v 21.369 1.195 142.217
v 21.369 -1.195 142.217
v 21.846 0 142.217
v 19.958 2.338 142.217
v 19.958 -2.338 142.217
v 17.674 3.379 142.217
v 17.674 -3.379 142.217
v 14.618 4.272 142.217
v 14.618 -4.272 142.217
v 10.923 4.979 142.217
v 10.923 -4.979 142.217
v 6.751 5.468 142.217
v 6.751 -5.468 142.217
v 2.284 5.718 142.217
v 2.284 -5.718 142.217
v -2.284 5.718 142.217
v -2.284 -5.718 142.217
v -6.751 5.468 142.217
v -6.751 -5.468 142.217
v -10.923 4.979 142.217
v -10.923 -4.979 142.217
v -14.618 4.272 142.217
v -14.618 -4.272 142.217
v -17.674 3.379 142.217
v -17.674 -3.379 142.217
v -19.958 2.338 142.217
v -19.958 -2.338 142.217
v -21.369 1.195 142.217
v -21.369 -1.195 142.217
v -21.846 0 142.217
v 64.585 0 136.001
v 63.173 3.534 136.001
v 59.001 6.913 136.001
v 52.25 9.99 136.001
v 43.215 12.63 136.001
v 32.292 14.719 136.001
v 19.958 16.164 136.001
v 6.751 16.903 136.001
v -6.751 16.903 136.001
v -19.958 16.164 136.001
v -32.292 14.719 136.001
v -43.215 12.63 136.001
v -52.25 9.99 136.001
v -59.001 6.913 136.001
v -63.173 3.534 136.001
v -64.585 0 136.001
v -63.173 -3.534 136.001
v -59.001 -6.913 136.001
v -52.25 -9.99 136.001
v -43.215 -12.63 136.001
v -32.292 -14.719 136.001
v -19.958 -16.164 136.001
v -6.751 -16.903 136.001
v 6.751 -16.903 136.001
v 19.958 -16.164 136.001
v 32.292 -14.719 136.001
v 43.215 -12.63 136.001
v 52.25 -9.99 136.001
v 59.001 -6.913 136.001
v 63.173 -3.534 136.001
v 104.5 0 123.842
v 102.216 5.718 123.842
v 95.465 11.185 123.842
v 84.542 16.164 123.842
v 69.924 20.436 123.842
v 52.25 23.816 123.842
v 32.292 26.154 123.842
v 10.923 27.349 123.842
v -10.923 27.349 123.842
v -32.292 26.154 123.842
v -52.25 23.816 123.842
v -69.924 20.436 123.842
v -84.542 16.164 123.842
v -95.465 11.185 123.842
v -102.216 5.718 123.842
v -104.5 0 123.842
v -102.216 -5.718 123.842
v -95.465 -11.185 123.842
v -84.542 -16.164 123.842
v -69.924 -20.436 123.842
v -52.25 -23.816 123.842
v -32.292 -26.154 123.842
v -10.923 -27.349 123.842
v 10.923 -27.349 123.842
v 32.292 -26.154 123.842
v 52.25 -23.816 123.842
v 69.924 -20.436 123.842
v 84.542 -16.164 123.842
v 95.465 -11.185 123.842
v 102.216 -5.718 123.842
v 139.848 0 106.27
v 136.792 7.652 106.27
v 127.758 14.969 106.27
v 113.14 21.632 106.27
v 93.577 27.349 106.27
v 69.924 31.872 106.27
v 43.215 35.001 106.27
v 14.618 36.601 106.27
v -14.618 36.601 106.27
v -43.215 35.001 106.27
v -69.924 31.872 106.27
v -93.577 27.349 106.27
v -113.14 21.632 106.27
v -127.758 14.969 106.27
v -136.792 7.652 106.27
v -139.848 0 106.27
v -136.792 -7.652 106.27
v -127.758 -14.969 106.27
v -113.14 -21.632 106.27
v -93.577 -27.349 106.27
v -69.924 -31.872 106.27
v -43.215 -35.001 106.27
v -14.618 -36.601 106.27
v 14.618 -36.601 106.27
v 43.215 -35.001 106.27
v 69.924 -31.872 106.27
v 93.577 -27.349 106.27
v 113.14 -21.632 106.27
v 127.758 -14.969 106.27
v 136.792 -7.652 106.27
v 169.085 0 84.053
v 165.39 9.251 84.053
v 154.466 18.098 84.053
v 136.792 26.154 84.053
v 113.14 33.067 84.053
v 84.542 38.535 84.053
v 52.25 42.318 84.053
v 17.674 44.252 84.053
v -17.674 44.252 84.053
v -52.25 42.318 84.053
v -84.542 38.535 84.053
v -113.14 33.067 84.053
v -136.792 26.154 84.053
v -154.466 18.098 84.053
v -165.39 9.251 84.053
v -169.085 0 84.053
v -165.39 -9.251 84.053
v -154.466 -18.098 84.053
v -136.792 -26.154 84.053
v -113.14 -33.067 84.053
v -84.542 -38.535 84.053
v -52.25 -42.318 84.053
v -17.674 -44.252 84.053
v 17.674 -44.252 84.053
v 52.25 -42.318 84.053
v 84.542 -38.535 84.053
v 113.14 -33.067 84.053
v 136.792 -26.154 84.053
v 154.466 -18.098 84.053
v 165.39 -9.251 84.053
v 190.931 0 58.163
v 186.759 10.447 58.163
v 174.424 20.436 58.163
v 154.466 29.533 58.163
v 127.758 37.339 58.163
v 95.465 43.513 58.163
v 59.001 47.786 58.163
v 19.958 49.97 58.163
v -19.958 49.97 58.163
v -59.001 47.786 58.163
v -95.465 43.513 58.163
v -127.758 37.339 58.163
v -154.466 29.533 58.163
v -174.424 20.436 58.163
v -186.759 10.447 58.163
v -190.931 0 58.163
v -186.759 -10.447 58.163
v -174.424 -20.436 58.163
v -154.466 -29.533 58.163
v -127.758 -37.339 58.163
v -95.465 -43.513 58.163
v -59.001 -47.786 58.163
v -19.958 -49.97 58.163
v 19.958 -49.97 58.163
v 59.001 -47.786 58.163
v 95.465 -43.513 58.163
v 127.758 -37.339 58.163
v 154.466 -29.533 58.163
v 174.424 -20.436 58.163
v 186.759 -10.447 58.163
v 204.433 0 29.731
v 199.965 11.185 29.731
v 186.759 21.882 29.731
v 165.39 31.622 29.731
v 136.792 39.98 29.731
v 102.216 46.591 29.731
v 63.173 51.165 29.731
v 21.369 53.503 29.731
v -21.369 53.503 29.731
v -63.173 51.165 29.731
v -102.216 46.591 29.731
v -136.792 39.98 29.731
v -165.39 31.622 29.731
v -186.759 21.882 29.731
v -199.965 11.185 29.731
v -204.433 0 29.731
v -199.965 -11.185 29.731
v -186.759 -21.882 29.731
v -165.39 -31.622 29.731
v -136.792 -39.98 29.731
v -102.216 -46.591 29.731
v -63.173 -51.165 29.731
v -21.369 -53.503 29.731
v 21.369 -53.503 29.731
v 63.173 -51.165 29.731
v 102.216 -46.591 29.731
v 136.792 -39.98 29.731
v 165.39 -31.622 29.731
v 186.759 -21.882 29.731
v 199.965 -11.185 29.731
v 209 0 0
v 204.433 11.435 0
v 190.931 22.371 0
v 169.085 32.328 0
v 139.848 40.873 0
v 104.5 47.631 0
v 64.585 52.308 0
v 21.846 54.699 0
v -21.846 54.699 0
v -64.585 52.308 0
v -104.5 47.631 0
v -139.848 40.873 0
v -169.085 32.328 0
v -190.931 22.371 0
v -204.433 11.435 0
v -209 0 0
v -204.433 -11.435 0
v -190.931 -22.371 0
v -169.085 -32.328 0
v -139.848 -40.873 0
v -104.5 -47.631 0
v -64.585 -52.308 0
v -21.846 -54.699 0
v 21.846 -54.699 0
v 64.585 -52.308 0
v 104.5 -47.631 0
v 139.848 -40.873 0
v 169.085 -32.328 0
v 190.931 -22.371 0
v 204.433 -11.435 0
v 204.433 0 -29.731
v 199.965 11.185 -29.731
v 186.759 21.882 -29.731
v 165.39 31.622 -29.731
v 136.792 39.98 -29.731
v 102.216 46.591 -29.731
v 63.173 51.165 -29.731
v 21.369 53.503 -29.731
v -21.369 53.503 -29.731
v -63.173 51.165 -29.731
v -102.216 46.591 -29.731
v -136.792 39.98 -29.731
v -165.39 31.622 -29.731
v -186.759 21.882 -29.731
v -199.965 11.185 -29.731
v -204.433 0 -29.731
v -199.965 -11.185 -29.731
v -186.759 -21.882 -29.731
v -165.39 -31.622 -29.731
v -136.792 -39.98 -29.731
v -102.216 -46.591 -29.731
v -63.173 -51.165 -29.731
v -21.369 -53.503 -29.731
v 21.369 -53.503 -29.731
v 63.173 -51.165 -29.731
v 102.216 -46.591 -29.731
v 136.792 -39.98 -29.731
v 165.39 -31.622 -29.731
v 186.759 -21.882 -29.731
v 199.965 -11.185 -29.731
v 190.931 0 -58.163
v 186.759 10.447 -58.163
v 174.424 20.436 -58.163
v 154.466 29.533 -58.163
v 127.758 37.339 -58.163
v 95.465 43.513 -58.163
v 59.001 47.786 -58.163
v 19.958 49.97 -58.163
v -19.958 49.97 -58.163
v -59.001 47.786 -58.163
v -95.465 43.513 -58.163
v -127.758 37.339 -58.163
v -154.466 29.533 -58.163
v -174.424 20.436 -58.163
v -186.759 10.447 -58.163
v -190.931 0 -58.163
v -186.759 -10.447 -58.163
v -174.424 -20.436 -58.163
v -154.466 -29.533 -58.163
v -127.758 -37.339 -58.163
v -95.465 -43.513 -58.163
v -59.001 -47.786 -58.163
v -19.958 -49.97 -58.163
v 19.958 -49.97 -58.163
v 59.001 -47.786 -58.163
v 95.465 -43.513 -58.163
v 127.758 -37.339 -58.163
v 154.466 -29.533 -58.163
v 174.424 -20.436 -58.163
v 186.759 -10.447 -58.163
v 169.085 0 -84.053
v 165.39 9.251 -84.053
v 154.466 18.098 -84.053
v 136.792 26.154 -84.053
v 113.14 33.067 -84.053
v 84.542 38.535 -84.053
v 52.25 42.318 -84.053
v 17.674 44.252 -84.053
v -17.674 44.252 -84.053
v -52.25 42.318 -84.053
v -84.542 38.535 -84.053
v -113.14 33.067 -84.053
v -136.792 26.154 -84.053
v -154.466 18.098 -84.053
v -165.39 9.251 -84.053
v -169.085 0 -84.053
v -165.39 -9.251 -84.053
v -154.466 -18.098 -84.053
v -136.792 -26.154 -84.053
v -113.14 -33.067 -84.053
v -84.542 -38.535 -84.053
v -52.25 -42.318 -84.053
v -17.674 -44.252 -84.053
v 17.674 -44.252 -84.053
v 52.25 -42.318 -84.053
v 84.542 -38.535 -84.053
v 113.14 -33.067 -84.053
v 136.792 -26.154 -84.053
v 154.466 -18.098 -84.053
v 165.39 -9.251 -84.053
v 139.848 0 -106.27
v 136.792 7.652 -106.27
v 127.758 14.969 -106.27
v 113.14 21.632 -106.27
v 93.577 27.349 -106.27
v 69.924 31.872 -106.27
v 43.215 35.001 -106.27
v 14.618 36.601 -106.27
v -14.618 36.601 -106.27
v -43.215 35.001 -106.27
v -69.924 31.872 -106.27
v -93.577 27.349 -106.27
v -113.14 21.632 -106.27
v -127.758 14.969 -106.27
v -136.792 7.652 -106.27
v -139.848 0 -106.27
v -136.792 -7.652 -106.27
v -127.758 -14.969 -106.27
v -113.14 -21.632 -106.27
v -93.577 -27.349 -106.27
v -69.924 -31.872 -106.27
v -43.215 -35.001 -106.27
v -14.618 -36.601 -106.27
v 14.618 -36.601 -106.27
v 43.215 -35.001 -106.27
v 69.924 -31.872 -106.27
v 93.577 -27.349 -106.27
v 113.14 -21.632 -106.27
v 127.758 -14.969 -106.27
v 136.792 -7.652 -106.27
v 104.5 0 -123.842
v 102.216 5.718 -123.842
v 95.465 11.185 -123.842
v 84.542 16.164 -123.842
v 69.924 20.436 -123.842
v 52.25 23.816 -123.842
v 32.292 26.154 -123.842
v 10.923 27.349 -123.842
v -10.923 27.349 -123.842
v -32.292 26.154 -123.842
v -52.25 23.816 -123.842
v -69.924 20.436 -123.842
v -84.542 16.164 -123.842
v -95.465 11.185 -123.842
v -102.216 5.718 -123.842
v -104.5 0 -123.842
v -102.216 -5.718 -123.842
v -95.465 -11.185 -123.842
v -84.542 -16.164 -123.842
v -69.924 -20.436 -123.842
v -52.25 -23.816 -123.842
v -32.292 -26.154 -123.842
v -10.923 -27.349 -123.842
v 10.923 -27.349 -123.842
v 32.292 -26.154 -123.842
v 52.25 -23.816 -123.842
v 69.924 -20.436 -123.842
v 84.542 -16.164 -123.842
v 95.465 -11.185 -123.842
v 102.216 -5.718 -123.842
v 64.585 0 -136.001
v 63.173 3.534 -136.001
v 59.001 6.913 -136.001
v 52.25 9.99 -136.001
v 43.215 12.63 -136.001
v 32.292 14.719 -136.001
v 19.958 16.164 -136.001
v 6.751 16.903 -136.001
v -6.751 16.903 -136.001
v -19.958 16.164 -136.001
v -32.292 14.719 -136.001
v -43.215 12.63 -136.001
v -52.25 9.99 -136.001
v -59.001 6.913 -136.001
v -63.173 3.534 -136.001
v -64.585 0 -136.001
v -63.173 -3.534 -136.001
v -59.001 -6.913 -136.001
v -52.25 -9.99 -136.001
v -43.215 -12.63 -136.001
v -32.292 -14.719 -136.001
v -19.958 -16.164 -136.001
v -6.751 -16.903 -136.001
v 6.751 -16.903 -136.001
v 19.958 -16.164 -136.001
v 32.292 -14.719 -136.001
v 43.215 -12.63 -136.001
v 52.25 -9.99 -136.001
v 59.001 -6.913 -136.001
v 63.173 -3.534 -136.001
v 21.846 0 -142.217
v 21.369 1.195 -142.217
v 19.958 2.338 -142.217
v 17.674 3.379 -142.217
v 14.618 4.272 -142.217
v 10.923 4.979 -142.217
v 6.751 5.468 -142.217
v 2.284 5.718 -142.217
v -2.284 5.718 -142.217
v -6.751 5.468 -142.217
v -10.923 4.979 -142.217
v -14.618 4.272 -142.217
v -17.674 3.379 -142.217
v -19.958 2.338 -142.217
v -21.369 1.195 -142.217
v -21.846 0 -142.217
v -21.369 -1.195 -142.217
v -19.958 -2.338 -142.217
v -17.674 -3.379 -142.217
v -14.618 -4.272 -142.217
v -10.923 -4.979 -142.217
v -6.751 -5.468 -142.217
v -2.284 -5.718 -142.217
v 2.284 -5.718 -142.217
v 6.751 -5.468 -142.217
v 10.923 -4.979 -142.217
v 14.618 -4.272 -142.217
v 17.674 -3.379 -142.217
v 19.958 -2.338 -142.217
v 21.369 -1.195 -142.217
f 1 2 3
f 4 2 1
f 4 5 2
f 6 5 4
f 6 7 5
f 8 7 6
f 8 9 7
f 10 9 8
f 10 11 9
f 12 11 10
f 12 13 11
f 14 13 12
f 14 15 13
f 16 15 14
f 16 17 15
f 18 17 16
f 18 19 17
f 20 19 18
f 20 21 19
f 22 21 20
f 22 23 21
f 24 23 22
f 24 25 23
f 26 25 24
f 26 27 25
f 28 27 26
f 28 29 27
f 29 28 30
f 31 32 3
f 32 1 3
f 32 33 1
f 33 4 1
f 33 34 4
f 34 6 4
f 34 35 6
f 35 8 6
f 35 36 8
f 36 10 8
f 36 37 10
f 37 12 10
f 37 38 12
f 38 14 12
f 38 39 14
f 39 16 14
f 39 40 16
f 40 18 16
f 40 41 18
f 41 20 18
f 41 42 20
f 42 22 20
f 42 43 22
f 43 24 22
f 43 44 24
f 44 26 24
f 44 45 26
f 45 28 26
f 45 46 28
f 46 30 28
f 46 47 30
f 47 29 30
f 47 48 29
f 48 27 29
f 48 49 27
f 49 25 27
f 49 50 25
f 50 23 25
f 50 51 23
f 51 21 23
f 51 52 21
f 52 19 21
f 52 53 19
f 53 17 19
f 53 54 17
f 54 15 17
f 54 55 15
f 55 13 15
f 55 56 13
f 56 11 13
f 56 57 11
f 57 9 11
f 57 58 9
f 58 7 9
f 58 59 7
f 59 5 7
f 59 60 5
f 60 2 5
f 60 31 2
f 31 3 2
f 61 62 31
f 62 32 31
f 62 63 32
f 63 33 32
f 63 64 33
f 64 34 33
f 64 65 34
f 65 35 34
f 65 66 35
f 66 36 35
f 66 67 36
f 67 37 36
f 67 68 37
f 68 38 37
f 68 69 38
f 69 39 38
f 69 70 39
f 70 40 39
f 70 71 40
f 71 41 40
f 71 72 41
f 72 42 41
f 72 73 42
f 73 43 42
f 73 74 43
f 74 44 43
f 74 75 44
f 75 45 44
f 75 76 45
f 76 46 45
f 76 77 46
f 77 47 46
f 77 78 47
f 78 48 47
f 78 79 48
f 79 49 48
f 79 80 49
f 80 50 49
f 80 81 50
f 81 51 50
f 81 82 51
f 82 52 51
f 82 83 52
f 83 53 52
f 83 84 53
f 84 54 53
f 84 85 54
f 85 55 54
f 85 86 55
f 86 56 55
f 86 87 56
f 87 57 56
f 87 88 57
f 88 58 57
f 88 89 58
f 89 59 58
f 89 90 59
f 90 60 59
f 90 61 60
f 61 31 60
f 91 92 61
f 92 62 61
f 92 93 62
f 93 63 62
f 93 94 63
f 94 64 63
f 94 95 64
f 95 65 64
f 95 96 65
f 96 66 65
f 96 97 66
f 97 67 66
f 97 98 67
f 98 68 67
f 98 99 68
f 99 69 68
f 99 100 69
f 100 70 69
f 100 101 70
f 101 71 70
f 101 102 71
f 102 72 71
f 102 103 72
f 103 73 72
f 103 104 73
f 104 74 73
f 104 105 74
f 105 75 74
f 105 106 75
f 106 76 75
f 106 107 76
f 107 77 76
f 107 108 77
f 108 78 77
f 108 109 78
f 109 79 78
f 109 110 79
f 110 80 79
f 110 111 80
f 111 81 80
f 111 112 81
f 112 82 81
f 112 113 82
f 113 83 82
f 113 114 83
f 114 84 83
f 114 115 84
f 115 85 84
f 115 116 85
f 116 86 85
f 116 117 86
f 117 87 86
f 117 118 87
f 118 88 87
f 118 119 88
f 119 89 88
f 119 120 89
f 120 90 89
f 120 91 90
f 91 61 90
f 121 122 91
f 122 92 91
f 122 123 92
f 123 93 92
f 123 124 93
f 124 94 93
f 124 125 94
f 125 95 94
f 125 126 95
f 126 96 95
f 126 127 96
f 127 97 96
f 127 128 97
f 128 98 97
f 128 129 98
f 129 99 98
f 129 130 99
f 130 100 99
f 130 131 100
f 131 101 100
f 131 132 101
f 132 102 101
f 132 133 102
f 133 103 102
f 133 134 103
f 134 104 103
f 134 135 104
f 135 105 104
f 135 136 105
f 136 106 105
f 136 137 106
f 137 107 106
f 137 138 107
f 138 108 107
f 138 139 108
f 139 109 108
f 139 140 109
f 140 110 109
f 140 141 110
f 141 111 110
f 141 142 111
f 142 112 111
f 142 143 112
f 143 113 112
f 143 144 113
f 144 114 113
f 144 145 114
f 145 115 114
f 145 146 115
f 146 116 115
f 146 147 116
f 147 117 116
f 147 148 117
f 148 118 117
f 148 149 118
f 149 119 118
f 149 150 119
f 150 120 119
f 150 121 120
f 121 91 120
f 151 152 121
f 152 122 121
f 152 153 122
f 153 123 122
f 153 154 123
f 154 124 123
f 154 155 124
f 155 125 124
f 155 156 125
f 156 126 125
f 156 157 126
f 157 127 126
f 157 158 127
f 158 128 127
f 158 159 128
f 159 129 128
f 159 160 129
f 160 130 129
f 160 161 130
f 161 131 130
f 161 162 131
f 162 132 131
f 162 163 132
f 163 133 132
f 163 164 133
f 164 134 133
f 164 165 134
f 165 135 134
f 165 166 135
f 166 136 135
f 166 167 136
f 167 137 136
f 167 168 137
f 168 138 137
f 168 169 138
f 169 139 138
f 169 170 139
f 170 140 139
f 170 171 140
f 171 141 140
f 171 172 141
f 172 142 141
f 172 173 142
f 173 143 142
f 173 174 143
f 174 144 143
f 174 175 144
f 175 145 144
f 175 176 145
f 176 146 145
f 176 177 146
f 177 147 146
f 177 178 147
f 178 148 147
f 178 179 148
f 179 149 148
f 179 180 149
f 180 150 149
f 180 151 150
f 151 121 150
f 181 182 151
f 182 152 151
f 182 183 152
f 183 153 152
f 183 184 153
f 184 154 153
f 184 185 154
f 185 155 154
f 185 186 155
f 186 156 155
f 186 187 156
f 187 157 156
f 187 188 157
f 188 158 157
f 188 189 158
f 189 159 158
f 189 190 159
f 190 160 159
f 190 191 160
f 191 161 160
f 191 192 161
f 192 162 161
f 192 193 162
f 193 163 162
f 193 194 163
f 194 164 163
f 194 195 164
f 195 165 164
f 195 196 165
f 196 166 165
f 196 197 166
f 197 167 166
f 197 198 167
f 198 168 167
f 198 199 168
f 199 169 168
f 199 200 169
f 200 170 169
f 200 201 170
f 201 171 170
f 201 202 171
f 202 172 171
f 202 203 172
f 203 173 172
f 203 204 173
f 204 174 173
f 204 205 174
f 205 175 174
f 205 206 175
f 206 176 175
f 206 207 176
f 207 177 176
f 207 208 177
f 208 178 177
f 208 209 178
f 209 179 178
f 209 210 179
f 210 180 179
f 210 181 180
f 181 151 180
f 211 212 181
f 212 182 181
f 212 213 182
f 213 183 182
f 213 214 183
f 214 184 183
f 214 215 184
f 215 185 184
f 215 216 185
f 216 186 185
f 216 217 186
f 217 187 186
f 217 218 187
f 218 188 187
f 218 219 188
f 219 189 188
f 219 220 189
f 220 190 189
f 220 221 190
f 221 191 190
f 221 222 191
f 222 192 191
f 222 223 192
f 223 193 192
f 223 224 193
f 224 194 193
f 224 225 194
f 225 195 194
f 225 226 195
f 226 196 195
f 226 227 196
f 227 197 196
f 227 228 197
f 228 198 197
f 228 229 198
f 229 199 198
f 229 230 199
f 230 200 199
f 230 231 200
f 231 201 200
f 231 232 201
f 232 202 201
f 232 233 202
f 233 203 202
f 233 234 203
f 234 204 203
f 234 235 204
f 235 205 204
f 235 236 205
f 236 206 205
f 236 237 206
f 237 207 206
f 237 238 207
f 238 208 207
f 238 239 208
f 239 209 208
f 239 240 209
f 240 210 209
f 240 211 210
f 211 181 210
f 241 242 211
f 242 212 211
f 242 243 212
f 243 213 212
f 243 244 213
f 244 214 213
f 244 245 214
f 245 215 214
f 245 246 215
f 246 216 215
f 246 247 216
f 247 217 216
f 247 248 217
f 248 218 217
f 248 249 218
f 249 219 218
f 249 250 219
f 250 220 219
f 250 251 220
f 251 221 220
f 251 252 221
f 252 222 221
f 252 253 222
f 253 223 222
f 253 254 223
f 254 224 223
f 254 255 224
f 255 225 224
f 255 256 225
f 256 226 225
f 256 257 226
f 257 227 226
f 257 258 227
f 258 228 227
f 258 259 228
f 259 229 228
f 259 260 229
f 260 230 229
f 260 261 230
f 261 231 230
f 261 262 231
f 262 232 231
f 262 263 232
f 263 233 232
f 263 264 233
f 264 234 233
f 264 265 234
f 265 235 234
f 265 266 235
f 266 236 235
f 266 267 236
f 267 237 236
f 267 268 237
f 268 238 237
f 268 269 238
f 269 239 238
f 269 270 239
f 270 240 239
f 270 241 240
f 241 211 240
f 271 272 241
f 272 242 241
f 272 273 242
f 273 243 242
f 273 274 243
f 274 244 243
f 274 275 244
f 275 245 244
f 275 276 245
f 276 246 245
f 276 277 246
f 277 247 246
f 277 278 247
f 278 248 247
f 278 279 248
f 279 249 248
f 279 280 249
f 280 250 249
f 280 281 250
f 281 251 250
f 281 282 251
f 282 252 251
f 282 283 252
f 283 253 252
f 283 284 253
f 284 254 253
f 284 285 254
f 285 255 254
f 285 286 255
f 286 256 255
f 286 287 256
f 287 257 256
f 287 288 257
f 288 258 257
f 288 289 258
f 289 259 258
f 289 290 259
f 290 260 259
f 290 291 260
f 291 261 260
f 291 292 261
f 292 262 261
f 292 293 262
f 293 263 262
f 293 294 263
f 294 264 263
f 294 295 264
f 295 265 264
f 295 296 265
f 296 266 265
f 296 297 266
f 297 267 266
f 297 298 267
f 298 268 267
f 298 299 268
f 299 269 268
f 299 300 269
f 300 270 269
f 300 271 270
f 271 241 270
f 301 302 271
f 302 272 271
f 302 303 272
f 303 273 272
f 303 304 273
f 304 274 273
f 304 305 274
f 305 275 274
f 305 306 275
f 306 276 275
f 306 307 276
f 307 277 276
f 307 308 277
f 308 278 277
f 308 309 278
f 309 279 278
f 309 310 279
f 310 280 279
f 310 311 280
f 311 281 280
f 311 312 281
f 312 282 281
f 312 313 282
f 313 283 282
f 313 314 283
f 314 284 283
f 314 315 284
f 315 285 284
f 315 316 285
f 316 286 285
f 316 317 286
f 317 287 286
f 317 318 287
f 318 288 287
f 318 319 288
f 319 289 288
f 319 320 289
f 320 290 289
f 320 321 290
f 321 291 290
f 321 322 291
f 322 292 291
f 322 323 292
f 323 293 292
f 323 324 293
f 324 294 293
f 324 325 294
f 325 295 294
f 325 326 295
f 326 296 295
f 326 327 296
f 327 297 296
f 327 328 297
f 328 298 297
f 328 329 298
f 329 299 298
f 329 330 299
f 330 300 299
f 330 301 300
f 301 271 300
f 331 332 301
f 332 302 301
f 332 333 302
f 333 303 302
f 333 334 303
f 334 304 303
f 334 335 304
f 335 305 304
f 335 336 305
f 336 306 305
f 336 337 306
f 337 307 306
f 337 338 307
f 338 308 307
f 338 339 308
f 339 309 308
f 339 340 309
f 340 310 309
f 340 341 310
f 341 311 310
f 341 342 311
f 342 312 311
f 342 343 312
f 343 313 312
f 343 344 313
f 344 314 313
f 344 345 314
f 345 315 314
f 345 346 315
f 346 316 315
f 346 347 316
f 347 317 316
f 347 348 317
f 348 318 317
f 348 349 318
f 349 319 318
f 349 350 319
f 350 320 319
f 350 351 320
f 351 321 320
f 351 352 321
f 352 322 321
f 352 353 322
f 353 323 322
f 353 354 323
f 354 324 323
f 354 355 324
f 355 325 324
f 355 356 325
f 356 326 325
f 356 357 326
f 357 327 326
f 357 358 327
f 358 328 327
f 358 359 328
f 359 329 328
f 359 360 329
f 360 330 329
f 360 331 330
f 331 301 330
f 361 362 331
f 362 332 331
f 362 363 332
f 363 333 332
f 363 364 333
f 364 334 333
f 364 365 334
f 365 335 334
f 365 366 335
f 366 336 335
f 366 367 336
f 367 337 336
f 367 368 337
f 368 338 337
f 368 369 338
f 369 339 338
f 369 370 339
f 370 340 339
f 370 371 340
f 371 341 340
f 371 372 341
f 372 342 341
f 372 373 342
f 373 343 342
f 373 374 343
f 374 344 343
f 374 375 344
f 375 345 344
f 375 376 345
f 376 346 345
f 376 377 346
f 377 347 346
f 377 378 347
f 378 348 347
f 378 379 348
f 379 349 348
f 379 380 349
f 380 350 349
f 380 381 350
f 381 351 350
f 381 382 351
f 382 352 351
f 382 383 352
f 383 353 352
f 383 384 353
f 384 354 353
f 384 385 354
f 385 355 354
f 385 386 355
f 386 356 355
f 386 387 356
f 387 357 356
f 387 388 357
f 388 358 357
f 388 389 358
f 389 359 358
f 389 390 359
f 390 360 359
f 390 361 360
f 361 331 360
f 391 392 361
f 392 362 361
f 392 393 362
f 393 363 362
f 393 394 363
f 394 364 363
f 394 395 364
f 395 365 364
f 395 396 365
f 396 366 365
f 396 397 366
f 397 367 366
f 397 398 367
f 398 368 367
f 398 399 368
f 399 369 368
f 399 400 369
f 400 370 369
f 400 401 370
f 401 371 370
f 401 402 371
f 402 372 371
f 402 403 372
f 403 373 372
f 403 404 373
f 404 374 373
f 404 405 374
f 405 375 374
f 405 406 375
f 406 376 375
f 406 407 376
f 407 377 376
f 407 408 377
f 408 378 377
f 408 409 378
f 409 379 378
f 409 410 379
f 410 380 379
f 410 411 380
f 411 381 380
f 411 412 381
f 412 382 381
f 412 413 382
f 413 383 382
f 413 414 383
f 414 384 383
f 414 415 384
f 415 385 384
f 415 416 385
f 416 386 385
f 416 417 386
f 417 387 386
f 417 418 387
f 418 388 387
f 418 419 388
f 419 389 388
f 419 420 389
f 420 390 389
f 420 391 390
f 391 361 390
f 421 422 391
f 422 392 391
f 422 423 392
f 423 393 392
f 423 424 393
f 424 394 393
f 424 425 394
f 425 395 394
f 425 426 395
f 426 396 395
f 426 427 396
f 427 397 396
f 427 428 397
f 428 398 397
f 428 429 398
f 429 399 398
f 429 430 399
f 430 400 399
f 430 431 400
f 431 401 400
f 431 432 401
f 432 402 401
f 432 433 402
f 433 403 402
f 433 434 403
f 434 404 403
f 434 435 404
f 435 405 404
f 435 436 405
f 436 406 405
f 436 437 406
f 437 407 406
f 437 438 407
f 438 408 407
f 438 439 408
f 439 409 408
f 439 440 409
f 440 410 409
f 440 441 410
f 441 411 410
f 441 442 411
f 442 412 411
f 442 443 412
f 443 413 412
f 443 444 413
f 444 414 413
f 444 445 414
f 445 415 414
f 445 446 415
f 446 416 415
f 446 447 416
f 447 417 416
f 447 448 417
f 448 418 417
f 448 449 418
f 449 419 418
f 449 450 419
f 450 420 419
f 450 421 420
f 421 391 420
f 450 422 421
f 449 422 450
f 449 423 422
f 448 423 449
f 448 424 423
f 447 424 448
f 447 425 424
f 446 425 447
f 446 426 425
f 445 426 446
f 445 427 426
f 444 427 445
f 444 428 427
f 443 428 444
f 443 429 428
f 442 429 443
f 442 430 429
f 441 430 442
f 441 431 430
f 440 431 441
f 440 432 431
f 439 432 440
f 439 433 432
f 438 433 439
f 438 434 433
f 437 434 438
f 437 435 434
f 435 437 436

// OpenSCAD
// Generated by SolidPython 1.0.1 on 2020-07-29 00:46:53


scale(v = [19, 5, 13]) {
	sphere(r = 11);
}
/***********************************************
*********      SolidPython code:      **********
************************************************
 
# import packages: SolidPython
from solid import *
from solid.utils import *
from itertools import chain, combinations, permutations


class Resize:

    def __init__(self, scad_file):
        self.scad_file = scad_file
        #self.scad_file = import_scad(scad_file)
        # cone/cylinder param:
        self.r1 = 0
        self.r2 = 0
        self.h = 0
        # rectangular prism param:
        self.w = 0
        self.l = 0
        # ellipse param:
        self.r = 0

    # import OpenScad code (file name corresponds to shape)


    # classify shape + parameters
    def assign(self, param1, param2, param3):
        if self.scad_file == 'cone.scad':
            self.r1 = param1
            self.r2 = param2
            self.h = param3
        elif self.scad_file == 'cylinder.scad':
            self.r1 = param1
            self.r2 = param2
            self.h = param3
        elif self.scad_file == 'rectangularPrism.scad':
            self.h = param1
            self.l = param2
            self.w = param3
        else:
            self.r = param1
            self.h = param2

    # resize parameters
    def iterate(self):
        x = range(3, 20, 2)
        i = 1
        if self.scad_file == 'cone.scad':
            tempList = list(permutations(x, 2))
            for temp in tempList:
                param1 = temp[0]
                param2 = temp[1]
                filepath = 'produced_scad_files/' + 'cone' + str(param1) + '_' + str(param2) + '_' + '.scad'
                scad_render_to_file(cylinder(h=param1, r1=param2, r2=0), filepath)

        elif self.scad_file == 'cylinder.scad':
            tempList = list(permutations(x, 3))
            for temp in tempList:
                param1 = temp[0]
                param2 = temp[1]
                filepath = 'produced_scad_files/' + 'cylinder' + str(param1) + '_' + str(param2) + '_' + '.scad'
                scad_render_to_file(cylinder(h=param1, r1=param2, r2=param2), filepath)

        elif self.scad_file == 'rectangularPrism.scad':
            tempList = list(permutations(x, 3))
            for temp in tempList:
                param1 = temp[0]
                param2 = temp[1]
                param3 = temp[2]
                filepath = 'produced_scad_files/' + 'rectangularPrism' + str(param1) + '_' + str(param2) + '_' + str(
                    param3) + '.scad'
                scad_render_to_file(cube(size=(param1, param2, param3)), filepath)

        elif self.scad_file == 'ellipse.scad':
            tempList = list(permutations(x, 4))
            for temp in tempList:
                param1 = temp[0]
                param2 = temp[1]
                param3 = temp[2]
                param4 = temp[3]
                filepath = 'produced_scad_files/' + 'ellipse' + str(param1) + '_' + str(param2) + '_' + str(param3) + '_' + str(param4) + '.scad'
                scad_render_to_file(scale([param1, param2, param3])(sphere(r=param4)), filepath)

    def render_to_scadfile(self):
        scad_render_to_file(scad, 'example.scad') 
 
************************************************/
